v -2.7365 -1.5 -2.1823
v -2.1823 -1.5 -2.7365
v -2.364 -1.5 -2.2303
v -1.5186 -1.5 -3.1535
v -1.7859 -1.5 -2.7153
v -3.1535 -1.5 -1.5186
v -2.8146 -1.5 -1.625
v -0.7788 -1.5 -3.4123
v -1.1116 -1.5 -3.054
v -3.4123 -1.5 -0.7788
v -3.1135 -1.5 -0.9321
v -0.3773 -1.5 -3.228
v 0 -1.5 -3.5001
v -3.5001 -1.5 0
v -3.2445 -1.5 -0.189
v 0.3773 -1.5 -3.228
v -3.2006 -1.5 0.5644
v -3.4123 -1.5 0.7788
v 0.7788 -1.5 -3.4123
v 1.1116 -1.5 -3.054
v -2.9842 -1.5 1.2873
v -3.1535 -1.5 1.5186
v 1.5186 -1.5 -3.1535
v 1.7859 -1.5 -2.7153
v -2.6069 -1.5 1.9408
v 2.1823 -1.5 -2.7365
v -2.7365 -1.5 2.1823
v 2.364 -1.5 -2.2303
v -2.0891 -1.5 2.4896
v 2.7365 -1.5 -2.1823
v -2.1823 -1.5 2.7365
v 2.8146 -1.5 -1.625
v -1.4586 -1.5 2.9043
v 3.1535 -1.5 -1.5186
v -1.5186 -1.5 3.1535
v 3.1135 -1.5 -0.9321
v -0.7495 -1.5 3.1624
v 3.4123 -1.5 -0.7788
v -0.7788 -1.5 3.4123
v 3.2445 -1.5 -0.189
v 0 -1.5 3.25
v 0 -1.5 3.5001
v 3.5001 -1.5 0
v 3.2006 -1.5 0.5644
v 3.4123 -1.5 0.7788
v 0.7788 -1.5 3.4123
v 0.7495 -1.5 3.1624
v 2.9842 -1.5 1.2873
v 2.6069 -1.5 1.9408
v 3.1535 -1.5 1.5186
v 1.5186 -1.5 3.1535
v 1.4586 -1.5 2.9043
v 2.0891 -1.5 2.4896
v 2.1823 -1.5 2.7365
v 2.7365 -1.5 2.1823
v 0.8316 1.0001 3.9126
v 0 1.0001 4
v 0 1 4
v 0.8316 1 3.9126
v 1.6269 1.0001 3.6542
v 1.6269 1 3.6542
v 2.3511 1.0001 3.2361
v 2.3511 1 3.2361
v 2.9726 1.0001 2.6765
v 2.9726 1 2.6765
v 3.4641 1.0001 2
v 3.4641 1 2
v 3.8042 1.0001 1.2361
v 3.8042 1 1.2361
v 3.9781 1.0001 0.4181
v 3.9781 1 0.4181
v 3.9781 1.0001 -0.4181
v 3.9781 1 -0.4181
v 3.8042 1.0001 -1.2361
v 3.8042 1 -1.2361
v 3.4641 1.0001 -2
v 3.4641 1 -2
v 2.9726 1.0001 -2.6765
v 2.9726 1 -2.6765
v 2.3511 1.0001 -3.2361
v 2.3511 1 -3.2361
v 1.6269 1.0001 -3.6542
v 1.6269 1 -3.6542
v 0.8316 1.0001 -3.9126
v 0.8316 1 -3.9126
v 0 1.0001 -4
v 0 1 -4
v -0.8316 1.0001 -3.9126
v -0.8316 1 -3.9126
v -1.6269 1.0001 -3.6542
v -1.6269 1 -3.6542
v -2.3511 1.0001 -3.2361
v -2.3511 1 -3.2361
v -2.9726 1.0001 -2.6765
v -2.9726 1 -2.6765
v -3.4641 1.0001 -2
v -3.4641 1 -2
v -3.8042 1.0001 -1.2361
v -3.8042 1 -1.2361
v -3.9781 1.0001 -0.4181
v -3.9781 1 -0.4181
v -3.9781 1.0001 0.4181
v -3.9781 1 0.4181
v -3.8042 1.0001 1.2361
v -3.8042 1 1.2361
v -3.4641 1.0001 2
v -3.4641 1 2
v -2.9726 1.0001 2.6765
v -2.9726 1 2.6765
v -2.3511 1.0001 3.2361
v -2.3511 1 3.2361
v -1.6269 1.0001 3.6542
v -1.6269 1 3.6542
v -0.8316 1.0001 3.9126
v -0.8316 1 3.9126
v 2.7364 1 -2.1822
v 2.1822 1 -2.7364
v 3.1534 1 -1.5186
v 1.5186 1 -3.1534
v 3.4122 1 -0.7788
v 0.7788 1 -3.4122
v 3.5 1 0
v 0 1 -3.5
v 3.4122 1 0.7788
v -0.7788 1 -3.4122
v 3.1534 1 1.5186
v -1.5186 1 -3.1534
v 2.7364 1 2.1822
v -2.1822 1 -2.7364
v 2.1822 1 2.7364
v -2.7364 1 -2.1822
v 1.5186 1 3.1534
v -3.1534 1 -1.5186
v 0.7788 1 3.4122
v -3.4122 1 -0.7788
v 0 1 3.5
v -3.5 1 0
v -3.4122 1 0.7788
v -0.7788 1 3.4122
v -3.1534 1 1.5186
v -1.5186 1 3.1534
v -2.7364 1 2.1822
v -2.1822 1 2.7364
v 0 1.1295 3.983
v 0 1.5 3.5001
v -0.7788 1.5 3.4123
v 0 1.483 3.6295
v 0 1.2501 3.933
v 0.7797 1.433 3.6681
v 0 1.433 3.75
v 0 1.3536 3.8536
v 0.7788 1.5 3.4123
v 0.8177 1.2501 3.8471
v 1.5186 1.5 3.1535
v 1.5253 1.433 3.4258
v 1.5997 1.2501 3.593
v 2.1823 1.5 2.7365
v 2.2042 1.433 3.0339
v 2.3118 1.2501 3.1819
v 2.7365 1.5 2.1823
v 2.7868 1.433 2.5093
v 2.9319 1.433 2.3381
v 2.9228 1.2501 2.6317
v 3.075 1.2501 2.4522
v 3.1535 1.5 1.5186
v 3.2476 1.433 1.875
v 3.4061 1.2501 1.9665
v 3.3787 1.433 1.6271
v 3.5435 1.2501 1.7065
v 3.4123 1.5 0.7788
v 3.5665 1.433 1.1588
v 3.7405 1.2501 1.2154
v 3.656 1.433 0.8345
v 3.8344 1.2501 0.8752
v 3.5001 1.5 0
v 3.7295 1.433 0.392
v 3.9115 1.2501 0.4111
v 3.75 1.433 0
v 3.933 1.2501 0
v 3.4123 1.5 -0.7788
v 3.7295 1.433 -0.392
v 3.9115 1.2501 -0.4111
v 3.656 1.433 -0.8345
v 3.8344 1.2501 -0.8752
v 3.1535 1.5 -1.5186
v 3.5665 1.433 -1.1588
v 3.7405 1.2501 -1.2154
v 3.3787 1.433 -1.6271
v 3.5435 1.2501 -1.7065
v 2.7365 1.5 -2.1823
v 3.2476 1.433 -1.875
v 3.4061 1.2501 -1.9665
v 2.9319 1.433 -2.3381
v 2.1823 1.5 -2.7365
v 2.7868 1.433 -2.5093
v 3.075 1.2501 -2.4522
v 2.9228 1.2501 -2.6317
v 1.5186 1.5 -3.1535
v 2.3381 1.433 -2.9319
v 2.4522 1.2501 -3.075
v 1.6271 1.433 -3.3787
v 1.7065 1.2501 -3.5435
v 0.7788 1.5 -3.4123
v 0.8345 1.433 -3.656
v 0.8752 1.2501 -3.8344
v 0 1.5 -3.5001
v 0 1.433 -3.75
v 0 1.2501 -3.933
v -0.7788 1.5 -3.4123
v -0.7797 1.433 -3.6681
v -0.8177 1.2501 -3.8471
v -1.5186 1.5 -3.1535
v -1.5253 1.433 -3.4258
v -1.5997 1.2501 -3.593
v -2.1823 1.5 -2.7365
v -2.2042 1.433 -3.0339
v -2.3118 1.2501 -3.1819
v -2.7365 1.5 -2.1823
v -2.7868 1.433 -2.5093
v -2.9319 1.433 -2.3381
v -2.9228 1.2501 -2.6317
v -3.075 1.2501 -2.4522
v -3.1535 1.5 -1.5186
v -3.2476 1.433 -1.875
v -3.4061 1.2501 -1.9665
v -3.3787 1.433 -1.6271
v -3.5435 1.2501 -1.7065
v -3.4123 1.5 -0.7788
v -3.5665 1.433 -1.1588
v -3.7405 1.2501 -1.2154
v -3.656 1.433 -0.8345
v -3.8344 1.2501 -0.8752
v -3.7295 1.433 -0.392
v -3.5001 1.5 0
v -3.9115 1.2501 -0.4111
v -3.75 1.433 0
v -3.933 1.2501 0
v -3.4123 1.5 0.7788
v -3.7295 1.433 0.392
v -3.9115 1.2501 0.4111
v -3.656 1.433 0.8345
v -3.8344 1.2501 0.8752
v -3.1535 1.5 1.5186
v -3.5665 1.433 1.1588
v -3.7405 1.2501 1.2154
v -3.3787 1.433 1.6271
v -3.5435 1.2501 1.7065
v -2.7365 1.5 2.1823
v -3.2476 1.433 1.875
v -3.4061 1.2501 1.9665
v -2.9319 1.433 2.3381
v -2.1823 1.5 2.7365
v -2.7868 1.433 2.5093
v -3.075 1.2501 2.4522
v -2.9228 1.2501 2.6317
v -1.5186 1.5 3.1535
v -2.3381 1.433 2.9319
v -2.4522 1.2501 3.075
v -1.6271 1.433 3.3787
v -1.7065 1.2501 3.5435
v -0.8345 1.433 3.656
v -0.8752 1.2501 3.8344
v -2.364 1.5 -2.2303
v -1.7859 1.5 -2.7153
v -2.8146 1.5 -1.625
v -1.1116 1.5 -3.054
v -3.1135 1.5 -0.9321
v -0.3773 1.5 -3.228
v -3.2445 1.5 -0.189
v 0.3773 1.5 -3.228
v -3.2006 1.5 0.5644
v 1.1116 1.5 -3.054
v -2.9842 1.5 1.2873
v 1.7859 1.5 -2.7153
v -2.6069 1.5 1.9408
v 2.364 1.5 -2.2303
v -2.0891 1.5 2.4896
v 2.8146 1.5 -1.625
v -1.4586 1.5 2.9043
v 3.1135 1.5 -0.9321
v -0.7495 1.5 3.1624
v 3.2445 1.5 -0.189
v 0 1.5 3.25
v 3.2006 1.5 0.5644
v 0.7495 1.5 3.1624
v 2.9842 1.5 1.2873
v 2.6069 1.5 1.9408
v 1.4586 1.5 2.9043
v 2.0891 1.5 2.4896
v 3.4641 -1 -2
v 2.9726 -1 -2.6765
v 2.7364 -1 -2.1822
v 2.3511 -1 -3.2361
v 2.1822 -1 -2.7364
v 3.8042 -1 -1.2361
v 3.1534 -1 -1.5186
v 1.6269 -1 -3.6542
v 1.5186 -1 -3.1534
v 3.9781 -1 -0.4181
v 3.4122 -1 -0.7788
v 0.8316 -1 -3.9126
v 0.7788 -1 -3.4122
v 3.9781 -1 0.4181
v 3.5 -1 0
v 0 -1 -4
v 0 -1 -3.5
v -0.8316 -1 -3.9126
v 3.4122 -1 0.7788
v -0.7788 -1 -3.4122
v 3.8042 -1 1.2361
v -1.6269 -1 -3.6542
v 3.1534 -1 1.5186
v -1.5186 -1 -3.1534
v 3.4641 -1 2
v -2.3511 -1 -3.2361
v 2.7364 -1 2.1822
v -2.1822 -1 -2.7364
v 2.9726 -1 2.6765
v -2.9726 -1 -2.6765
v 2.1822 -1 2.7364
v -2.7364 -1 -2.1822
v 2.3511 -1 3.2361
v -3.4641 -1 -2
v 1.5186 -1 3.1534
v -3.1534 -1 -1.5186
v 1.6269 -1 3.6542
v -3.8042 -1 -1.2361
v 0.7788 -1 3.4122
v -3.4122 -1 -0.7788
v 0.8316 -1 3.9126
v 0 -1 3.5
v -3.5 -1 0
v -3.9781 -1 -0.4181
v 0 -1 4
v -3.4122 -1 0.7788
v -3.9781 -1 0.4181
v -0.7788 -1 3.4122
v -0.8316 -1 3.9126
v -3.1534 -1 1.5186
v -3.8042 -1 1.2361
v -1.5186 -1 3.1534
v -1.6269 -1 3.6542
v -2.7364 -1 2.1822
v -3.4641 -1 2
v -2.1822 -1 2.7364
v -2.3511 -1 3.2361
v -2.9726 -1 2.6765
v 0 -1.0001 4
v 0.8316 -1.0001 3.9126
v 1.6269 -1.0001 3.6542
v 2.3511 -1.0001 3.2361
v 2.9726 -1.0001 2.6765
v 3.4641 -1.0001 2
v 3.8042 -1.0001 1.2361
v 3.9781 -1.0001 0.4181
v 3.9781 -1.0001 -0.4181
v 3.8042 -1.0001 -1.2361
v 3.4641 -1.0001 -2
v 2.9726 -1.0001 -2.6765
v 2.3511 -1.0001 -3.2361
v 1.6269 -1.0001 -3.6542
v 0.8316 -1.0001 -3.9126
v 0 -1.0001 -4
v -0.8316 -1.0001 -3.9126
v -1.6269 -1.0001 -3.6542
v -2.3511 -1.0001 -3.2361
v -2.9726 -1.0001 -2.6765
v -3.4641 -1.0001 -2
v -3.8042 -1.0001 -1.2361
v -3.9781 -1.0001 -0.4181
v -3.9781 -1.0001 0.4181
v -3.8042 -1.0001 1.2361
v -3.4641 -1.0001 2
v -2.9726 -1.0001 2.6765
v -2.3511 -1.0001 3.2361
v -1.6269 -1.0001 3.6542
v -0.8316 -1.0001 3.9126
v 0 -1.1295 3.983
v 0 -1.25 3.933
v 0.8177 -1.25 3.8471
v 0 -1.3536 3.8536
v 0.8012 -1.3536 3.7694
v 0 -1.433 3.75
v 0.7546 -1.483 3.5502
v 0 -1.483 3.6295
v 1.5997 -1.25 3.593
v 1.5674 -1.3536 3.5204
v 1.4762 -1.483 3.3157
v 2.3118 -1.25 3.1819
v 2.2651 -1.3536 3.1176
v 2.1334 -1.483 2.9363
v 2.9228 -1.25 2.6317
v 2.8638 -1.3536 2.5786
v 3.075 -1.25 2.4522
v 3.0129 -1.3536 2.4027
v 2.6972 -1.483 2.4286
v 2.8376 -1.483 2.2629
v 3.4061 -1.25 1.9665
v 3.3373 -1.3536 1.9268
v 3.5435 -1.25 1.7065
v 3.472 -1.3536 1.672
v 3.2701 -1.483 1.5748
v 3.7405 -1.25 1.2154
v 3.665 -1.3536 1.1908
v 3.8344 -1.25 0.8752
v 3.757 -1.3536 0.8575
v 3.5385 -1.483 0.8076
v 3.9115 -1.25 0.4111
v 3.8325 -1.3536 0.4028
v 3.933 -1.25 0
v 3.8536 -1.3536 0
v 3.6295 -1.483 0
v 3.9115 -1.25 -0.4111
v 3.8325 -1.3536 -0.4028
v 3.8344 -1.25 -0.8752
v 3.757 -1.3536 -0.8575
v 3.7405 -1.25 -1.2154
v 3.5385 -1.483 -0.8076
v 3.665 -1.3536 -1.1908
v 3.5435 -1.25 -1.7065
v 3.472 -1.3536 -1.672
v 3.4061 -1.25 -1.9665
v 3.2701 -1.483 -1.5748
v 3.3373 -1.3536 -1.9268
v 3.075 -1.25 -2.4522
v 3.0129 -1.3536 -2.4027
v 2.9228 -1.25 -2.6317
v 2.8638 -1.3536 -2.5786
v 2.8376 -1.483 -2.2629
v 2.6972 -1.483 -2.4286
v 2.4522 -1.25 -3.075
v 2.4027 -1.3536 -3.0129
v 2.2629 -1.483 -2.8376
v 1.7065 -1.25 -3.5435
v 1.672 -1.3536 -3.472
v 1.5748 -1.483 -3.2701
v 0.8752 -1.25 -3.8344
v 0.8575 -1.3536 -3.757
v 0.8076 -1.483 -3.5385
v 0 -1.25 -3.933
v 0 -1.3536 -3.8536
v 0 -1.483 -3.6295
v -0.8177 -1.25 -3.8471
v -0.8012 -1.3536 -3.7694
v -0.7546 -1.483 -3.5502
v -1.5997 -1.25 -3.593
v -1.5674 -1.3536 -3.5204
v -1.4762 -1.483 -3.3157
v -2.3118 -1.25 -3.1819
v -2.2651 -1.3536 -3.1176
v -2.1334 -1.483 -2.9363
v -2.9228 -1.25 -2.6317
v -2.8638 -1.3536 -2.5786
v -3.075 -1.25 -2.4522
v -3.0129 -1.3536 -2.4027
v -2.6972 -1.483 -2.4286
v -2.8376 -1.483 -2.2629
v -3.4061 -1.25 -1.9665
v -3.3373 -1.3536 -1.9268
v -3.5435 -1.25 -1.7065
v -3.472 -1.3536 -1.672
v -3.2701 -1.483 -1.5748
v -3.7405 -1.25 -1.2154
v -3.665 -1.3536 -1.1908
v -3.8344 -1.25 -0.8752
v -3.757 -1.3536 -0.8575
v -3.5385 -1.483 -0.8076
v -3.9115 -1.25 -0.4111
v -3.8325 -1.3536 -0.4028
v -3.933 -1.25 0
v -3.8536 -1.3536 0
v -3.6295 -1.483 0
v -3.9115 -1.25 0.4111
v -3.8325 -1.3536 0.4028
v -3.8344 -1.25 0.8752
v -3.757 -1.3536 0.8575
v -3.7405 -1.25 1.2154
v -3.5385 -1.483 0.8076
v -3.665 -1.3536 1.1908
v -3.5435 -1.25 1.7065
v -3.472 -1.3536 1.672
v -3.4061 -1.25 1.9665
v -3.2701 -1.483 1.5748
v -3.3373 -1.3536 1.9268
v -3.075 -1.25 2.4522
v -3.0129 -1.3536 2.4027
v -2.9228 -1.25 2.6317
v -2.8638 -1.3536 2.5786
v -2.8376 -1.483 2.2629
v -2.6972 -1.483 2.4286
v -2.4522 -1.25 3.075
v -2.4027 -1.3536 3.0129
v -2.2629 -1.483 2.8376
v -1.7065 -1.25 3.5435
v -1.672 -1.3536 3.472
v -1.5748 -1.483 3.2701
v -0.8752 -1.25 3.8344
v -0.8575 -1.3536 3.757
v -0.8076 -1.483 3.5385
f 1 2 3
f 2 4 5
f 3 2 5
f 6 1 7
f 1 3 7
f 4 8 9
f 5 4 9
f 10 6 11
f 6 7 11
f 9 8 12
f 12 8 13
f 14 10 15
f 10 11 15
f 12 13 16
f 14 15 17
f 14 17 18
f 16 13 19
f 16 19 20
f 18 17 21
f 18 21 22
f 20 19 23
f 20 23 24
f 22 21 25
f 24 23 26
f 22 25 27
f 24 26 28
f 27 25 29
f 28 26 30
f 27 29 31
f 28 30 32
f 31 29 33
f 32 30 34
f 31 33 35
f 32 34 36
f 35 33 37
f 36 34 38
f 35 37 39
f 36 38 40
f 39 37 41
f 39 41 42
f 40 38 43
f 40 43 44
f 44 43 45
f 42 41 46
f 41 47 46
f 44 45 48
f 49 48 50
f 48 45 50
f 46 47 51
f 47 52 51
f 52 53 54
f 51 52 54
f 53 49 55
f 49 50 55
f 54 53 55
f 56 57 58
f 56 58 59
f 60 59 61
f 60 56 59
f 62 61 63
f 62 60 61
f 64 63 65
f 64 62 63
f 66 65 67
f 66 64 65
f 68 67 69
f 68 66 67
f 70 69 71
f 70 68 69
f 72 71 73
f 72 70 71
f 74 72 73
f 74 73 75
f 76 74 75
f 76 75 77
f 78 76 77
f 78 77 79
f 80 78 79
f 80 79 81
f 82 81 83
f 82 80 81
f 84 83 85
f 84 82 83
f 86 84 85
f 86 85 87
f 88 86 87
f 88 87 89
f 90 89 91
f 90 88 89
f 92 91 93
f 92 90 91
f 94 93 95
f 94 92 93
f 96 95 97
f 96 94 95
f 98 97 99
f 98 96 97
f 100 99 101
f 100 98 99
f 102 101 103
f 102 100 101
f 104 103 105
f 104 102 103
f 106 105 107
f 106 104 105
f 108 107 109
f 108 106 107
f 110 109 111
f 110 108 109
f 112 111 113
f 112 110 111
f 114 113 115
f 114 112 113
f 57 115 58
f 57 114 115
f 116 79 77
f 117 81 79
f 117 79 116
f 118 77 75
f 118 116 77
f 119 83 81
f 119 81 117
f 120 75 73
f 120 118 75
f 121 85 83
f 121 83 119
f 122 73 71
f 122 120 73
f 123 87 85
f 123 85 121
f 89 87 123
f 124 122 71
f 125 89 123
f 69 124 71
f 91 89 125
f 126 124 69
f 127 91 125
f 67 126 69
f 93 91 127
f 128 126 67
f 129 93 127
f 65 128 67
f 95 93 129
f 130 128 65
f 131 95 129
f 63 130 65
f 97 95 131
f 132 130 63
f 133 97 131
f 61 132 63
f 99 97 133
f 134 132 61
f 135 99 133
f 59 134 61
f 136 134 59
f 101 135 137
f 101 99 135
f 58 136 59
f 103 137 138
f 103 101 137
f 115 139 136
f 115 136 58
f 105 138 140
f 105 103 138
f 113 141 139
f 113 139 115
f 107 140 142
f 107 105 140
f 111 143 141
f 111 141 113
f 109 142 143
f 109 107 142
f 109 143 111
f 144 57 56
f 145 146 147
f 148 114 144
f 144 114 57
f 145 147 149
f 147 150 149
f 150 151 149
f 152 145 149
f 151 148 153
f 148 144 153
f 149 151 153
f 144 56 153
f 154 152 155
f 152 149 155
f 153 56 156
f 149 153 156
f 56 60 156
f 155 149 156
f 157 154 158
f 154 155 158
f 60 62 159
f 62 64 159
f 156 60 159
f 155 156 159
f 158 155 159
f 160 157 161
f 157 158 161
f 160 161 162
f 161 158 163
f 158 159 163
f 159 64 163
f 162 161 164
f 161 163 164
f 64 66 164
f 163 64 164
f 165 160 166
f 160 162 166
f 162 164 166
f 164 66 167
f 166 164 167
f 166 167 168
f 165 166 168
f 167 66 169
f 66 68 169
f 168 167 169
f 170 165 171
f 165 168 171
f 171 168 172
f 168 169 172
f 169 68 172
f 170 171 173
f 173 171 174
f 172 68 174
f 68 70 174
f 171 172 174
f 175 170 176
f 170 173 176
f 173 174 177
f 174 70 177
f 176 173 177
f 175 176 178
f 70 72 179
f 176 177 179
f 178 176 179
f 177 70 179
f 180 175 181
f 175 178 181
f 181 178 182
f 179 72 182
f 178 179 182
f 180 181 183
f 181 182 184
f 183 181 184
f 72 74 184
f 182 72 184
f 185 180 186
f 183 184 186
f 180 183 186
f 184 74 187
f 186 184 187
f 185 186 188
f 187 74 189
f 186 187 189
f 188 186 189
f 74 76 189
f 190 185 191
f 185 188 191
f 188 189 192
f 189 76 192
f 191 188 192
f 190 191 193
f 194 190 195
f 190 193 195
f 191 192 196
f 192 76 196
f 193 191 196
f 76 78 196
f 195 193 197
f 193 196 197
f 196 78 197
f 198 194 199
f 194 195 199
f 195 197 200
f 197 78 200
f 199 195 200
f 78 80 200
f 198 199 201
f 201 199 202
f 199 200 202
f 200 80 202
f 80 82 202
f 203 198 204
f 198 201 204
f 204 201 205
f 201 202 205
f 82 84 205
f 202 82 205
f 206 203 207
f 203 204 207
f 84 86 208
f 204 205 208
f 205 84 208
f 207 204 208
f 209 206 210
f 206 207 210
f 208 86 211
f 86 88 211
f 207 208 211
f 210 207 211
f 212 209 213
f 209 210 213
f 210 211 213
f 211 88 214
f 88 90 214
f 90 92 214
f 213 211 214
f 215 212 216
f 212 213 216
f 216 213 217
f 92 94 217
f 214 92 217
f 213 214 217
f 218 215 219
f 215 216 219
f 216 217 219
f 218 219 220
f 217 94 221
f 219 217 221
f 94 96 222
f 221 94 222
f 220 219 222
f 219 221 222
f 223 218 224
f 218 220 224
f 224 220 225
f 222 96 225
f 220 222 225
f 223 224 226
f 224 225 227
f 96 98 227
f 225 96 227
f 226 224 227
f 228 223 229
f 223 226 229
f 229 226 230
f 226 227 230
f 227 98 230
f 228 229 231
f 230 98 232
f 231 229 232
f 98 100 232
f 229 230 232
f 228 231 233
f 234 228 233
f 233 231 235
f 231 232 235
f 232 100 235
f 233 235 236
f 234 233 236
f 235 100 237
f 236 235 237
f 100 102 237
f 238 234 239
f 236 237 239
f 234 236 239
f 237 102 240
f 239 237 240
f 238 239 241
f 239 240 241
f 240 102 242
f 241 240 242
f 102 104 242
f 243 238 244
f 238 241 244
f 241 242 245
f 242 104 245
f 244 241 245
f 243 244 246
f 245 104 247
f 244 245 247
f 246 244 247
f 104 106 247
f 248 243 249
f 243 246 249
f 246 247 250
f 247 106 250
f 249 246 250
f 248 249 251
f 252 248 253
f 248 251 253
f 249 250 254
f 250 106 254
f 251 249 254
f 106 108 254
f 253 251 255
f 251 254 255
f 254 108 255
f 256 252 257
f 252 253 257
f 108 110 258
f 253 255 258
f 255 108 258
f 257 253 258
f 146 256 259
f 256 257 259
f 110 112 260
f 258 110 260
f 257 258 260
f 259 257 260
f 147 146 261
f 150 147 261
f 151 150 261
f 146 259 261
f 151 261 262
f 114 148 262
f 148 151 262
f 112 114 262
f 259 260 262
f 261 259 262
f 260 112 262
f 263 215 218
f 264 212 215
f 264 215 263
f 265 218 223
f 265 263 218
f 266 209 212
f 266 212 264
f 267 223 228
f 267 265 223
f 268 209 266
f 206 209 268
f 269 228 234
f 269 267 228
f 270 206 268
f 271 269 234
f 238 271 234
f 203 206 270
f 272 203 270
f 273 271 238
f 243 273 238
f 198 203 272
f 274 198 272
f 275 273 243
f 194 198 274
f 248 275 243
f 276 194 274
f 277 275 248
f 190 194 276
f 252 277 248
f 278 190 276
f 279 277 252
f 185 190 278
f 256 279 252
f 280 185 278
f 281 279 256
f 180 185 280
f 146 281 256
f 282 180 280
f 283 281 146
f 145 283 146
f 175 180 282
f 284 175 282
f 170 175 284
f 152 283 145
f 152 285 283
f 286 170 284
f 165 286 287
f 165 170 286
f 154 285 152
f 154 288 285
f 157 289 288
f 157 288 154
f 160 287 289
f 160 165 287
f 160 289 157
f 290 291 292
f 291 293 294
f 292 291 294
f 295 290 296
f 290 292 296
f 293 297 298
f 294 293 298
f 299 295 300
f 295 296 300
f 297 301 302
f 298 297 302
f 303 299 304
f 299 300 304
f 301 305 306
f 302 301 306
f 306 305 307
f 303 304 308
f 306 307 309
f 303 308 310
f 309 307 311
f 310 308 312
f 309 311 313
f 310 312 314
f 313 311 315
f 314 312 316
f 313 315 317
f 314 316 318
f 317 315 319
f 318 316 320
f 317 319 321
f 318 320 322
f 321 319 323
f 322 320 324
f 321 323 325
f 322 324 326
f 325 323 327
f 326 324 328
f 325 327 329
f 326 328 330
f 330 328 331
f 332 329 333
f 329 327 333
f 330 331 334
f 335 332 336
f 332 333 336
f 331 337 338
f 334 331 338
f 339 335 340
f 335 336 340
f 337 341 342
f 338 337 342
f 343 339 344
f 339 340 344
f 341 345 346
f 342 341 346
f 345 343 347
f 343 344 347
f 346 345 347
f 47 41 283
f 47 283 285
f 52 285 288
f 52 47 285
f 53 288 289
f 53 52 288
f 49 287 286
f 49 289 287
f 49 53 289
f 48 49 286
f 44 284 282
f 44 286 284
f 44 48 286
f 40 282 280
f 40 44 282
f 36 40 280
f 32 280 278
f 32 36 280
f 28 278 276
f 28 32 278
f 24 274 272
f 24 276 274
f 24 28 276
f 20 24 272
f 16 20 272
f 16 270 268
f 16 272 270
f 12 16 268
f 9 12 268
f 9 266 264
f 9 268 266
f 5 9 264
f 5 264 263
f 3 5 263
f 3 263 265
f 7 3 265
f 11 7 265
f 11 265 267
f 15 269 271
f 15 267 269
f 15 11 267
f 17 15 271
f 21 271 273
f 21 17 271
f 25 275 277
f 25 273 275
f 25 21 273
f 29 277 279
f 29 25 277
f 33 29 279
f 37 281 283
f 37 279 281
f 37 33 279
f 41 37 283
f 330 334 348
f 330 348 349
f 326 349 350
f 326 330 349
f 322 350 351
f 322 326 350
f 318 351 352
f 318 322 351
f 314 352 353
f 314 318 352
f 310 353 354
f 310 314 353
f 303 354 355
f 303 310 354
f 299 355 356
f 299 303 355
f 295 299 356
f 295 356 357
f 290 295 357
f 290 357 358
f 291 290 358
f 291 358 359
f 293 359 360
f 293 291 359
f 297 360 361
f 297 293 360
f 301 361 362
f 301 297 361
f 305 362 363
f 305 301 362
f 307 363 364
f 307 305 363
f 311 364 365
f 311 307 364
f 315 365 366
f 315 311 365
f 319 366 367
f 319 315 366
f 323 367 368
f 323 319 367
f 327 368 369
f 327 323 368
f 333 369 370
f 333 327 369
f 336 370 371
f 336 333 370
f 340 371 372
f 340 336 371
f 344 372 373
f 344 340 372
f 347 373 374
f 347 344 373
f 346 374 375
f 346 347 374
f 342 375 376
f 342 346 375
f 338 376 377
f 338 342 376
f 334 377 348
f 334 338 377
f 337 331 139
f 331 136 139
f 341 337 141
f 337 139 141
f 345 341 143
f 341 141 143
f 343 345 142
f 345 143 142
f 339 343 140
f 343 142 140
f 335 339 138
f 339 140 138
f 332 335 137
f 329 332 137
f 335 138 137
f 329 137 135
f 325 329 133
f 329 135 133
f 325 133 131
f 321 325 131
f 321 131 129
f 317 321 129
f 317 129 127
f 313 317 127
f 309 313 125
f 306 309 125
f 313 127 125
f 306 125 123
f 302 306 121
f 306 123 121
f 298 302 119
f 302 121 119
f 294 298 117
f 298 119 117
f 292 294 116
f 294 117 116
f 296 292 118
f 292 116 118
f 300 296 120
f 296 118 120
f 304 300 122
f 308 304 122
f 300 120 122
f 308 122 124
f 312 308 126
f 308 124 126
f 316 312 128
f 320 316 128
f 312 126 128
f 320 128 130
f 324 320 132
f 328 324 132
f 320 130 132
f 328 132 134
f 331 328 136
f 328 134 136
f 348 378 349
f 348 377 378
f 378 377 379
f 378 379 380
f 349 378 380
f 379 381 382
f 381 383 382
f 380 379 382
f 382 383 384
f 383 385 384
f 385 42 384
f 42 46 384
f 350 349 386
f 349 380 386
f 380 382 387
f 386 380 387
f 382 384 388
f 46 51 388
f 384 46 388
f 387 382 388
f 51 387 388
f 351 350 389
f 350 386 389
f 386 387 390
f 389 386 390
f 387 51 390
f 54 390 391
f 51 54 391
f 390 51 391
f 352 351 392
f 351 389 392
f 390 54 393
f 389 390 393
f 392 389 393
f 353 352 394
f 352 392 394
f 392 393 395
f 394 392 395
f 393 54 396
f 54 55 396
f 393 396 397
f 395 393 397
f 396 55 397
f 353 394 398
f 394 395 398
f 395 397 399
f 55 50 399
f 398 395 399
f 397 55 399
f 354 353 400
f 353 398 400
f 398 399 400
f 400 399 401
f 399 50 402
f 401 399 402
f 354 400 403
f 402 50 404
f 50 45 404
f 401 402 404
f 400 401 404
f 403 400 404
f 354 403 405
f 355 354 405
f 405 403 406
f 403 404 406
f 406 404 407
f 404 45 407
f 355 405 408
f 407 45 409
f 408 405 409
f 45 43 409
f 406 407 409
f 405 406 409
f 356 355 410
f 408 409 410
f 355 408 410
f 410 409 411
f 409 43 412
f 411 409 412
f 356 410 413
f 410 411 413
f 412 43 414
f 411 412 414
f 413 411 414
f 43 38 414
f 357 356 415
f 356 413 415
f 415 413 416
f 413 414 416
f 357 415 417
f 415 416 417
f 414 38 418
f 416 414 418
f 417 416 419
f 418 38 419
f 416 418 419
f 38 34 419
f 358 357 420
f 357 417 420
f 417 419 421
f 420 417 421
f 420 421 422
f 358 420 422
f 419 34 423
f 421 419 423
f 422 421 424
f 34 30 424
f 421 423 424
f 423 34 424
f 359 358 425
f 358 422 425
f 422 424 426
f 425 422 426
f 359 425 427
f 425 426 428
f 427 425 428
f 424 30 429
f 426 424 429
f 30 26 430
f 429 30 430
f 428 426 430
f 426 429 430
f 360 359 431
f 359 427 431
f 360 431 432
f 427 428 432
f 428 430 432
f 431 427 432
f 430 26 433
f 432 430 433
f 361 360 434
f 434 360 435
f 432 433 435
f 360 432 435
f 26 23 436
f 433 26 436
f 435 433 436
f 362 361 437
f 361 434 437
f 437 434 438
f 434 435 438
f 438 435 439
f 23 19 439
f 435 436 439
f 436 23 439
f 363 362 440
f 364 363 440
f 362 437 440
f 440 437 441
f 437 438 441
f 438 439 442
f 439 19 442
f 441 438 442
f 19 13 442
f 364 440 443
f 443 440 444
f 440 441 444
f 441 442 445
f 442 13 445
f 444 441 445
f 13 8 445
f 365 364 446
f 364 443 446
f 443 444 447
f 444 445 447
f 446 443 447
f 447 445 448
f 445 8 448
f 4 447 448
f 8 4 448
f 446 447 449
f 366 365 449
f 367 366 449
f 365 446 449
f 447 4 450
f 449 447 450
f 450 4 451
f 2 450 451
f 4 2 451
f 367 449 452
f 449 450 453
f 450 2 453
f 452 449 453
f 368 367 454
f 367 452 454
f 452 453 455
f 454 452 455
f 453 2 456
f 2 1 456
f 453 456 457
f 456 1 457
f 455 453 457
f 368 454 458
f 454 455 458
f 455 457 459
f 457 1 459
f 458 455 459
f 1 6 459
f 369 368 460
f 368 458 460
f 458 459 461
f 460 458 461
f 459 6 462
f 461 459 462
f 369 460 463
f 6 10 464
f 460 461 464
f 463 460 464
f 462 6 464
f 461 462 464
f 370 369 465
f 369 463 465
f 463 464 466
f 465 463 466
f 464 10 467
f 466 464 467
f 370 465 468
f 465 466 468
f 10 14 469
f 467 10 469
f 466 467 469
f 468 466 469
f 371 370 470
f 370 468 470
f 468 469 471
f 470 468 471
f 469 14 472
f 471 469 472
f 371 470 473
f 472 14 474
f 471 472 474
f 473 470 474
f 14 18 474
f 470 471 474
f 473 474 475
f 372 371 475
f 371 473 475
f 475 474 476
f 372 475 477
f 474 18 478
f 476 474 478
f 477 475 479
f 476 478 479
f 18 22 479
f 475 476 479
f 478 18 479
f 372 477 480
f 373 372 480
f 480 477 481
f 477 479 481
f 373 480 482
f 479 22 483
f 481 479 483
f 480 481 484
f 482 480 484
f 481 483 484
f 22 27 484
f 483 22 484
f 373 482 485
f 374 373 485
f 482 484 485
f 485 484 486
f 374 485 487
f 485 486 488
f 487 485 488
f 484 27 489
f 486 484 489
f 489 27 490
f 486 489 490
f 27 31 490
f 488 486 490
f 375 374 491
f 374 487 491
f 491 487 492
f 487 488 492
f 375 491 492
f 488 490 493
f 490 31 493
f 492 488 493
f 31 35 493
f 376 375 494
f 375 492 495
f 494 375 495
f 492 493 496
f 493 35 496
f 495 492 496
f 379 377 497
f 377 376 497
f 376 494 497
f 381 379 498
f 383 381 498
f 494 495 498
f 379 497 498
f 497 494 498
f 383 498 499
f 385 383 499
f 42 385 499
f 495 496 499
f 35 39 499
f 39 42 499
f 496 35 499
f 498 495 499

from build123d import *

# Parameters (mm, degrees)
SKETCH1_R               = 4
BOSS_EXTRUDE1_DEPTH     = 1.5
CUT_EXTRUDE1_DEPTH      = 6.852349955
CUT_EXTRUDE1_DEPTH_BACK = 6.852349955
SKETCH2_R               = 3.25
SKETCH4_W               = 0.5
SKETCH4_H               = 2
FILLET1_R               = 0.5


with BuildPart() as part:
    # Sketch1 → Boss-Extrude1 (new, symmetric)
    with BuildSketch(Plane(origin=(0, 0, 0), x_dir=(1, 0, 0), z_dir=(0, 1, 0))):
        with Locations(Location((0, 0, 0), (0, 0, 270))):
            Circle(SKETCH1_R)
    extrude(amount=BOSS_EXTRUDE1_DEPTH, both=True)

    # Sketch2 → Cut-Extrude1 (cut, two sides: drawn at the far end of the back side and taken through both)
    with BuildSketch(Plane(origin=(0, 0, 0), x_dir=(1, 0, 0), z_dir=(0, 1, 0)).offset(-CUT_EXTRUDE1_DEPTH_BACK)):
        with Locations(Location((0, 0, 0), (0, 0, 270))):
            Circle(SKETCH2_R)
    extrude(amount=CUT_EXTRUDE1_DEPTH + CUT_EXTRUDE1_DEPTH_BACK, mode=Mode.SUBTRACT)

    # Sketch4 → Cut-Revolve1 (revolve, cut)
    with BuildSketch(Plane(origin=(0, 0, 0), x_dir=(0, 0, -1), z_dir=(1, 0, 0))):
        with Locations((-3.75, 0)):
            Rectangle(SKETCH4_W, SKETCH4_H)
    revolve(axis=Axis((0, 1.1156594, 0), (0, -1, 0)), mode=Mode.SUBTRACT)

    # Fillet1
    fillet1_edges = [part.edges().sort_by_distance(p)[0] for p in [
        (0, -1.5, -4),
        (0, 1.5, -4),
    ]]
    fillet(fillet1_edges, radius=FILLET1_R - 0.0001)  # a hair under: the kernel refuses the full size


solid = part.part
